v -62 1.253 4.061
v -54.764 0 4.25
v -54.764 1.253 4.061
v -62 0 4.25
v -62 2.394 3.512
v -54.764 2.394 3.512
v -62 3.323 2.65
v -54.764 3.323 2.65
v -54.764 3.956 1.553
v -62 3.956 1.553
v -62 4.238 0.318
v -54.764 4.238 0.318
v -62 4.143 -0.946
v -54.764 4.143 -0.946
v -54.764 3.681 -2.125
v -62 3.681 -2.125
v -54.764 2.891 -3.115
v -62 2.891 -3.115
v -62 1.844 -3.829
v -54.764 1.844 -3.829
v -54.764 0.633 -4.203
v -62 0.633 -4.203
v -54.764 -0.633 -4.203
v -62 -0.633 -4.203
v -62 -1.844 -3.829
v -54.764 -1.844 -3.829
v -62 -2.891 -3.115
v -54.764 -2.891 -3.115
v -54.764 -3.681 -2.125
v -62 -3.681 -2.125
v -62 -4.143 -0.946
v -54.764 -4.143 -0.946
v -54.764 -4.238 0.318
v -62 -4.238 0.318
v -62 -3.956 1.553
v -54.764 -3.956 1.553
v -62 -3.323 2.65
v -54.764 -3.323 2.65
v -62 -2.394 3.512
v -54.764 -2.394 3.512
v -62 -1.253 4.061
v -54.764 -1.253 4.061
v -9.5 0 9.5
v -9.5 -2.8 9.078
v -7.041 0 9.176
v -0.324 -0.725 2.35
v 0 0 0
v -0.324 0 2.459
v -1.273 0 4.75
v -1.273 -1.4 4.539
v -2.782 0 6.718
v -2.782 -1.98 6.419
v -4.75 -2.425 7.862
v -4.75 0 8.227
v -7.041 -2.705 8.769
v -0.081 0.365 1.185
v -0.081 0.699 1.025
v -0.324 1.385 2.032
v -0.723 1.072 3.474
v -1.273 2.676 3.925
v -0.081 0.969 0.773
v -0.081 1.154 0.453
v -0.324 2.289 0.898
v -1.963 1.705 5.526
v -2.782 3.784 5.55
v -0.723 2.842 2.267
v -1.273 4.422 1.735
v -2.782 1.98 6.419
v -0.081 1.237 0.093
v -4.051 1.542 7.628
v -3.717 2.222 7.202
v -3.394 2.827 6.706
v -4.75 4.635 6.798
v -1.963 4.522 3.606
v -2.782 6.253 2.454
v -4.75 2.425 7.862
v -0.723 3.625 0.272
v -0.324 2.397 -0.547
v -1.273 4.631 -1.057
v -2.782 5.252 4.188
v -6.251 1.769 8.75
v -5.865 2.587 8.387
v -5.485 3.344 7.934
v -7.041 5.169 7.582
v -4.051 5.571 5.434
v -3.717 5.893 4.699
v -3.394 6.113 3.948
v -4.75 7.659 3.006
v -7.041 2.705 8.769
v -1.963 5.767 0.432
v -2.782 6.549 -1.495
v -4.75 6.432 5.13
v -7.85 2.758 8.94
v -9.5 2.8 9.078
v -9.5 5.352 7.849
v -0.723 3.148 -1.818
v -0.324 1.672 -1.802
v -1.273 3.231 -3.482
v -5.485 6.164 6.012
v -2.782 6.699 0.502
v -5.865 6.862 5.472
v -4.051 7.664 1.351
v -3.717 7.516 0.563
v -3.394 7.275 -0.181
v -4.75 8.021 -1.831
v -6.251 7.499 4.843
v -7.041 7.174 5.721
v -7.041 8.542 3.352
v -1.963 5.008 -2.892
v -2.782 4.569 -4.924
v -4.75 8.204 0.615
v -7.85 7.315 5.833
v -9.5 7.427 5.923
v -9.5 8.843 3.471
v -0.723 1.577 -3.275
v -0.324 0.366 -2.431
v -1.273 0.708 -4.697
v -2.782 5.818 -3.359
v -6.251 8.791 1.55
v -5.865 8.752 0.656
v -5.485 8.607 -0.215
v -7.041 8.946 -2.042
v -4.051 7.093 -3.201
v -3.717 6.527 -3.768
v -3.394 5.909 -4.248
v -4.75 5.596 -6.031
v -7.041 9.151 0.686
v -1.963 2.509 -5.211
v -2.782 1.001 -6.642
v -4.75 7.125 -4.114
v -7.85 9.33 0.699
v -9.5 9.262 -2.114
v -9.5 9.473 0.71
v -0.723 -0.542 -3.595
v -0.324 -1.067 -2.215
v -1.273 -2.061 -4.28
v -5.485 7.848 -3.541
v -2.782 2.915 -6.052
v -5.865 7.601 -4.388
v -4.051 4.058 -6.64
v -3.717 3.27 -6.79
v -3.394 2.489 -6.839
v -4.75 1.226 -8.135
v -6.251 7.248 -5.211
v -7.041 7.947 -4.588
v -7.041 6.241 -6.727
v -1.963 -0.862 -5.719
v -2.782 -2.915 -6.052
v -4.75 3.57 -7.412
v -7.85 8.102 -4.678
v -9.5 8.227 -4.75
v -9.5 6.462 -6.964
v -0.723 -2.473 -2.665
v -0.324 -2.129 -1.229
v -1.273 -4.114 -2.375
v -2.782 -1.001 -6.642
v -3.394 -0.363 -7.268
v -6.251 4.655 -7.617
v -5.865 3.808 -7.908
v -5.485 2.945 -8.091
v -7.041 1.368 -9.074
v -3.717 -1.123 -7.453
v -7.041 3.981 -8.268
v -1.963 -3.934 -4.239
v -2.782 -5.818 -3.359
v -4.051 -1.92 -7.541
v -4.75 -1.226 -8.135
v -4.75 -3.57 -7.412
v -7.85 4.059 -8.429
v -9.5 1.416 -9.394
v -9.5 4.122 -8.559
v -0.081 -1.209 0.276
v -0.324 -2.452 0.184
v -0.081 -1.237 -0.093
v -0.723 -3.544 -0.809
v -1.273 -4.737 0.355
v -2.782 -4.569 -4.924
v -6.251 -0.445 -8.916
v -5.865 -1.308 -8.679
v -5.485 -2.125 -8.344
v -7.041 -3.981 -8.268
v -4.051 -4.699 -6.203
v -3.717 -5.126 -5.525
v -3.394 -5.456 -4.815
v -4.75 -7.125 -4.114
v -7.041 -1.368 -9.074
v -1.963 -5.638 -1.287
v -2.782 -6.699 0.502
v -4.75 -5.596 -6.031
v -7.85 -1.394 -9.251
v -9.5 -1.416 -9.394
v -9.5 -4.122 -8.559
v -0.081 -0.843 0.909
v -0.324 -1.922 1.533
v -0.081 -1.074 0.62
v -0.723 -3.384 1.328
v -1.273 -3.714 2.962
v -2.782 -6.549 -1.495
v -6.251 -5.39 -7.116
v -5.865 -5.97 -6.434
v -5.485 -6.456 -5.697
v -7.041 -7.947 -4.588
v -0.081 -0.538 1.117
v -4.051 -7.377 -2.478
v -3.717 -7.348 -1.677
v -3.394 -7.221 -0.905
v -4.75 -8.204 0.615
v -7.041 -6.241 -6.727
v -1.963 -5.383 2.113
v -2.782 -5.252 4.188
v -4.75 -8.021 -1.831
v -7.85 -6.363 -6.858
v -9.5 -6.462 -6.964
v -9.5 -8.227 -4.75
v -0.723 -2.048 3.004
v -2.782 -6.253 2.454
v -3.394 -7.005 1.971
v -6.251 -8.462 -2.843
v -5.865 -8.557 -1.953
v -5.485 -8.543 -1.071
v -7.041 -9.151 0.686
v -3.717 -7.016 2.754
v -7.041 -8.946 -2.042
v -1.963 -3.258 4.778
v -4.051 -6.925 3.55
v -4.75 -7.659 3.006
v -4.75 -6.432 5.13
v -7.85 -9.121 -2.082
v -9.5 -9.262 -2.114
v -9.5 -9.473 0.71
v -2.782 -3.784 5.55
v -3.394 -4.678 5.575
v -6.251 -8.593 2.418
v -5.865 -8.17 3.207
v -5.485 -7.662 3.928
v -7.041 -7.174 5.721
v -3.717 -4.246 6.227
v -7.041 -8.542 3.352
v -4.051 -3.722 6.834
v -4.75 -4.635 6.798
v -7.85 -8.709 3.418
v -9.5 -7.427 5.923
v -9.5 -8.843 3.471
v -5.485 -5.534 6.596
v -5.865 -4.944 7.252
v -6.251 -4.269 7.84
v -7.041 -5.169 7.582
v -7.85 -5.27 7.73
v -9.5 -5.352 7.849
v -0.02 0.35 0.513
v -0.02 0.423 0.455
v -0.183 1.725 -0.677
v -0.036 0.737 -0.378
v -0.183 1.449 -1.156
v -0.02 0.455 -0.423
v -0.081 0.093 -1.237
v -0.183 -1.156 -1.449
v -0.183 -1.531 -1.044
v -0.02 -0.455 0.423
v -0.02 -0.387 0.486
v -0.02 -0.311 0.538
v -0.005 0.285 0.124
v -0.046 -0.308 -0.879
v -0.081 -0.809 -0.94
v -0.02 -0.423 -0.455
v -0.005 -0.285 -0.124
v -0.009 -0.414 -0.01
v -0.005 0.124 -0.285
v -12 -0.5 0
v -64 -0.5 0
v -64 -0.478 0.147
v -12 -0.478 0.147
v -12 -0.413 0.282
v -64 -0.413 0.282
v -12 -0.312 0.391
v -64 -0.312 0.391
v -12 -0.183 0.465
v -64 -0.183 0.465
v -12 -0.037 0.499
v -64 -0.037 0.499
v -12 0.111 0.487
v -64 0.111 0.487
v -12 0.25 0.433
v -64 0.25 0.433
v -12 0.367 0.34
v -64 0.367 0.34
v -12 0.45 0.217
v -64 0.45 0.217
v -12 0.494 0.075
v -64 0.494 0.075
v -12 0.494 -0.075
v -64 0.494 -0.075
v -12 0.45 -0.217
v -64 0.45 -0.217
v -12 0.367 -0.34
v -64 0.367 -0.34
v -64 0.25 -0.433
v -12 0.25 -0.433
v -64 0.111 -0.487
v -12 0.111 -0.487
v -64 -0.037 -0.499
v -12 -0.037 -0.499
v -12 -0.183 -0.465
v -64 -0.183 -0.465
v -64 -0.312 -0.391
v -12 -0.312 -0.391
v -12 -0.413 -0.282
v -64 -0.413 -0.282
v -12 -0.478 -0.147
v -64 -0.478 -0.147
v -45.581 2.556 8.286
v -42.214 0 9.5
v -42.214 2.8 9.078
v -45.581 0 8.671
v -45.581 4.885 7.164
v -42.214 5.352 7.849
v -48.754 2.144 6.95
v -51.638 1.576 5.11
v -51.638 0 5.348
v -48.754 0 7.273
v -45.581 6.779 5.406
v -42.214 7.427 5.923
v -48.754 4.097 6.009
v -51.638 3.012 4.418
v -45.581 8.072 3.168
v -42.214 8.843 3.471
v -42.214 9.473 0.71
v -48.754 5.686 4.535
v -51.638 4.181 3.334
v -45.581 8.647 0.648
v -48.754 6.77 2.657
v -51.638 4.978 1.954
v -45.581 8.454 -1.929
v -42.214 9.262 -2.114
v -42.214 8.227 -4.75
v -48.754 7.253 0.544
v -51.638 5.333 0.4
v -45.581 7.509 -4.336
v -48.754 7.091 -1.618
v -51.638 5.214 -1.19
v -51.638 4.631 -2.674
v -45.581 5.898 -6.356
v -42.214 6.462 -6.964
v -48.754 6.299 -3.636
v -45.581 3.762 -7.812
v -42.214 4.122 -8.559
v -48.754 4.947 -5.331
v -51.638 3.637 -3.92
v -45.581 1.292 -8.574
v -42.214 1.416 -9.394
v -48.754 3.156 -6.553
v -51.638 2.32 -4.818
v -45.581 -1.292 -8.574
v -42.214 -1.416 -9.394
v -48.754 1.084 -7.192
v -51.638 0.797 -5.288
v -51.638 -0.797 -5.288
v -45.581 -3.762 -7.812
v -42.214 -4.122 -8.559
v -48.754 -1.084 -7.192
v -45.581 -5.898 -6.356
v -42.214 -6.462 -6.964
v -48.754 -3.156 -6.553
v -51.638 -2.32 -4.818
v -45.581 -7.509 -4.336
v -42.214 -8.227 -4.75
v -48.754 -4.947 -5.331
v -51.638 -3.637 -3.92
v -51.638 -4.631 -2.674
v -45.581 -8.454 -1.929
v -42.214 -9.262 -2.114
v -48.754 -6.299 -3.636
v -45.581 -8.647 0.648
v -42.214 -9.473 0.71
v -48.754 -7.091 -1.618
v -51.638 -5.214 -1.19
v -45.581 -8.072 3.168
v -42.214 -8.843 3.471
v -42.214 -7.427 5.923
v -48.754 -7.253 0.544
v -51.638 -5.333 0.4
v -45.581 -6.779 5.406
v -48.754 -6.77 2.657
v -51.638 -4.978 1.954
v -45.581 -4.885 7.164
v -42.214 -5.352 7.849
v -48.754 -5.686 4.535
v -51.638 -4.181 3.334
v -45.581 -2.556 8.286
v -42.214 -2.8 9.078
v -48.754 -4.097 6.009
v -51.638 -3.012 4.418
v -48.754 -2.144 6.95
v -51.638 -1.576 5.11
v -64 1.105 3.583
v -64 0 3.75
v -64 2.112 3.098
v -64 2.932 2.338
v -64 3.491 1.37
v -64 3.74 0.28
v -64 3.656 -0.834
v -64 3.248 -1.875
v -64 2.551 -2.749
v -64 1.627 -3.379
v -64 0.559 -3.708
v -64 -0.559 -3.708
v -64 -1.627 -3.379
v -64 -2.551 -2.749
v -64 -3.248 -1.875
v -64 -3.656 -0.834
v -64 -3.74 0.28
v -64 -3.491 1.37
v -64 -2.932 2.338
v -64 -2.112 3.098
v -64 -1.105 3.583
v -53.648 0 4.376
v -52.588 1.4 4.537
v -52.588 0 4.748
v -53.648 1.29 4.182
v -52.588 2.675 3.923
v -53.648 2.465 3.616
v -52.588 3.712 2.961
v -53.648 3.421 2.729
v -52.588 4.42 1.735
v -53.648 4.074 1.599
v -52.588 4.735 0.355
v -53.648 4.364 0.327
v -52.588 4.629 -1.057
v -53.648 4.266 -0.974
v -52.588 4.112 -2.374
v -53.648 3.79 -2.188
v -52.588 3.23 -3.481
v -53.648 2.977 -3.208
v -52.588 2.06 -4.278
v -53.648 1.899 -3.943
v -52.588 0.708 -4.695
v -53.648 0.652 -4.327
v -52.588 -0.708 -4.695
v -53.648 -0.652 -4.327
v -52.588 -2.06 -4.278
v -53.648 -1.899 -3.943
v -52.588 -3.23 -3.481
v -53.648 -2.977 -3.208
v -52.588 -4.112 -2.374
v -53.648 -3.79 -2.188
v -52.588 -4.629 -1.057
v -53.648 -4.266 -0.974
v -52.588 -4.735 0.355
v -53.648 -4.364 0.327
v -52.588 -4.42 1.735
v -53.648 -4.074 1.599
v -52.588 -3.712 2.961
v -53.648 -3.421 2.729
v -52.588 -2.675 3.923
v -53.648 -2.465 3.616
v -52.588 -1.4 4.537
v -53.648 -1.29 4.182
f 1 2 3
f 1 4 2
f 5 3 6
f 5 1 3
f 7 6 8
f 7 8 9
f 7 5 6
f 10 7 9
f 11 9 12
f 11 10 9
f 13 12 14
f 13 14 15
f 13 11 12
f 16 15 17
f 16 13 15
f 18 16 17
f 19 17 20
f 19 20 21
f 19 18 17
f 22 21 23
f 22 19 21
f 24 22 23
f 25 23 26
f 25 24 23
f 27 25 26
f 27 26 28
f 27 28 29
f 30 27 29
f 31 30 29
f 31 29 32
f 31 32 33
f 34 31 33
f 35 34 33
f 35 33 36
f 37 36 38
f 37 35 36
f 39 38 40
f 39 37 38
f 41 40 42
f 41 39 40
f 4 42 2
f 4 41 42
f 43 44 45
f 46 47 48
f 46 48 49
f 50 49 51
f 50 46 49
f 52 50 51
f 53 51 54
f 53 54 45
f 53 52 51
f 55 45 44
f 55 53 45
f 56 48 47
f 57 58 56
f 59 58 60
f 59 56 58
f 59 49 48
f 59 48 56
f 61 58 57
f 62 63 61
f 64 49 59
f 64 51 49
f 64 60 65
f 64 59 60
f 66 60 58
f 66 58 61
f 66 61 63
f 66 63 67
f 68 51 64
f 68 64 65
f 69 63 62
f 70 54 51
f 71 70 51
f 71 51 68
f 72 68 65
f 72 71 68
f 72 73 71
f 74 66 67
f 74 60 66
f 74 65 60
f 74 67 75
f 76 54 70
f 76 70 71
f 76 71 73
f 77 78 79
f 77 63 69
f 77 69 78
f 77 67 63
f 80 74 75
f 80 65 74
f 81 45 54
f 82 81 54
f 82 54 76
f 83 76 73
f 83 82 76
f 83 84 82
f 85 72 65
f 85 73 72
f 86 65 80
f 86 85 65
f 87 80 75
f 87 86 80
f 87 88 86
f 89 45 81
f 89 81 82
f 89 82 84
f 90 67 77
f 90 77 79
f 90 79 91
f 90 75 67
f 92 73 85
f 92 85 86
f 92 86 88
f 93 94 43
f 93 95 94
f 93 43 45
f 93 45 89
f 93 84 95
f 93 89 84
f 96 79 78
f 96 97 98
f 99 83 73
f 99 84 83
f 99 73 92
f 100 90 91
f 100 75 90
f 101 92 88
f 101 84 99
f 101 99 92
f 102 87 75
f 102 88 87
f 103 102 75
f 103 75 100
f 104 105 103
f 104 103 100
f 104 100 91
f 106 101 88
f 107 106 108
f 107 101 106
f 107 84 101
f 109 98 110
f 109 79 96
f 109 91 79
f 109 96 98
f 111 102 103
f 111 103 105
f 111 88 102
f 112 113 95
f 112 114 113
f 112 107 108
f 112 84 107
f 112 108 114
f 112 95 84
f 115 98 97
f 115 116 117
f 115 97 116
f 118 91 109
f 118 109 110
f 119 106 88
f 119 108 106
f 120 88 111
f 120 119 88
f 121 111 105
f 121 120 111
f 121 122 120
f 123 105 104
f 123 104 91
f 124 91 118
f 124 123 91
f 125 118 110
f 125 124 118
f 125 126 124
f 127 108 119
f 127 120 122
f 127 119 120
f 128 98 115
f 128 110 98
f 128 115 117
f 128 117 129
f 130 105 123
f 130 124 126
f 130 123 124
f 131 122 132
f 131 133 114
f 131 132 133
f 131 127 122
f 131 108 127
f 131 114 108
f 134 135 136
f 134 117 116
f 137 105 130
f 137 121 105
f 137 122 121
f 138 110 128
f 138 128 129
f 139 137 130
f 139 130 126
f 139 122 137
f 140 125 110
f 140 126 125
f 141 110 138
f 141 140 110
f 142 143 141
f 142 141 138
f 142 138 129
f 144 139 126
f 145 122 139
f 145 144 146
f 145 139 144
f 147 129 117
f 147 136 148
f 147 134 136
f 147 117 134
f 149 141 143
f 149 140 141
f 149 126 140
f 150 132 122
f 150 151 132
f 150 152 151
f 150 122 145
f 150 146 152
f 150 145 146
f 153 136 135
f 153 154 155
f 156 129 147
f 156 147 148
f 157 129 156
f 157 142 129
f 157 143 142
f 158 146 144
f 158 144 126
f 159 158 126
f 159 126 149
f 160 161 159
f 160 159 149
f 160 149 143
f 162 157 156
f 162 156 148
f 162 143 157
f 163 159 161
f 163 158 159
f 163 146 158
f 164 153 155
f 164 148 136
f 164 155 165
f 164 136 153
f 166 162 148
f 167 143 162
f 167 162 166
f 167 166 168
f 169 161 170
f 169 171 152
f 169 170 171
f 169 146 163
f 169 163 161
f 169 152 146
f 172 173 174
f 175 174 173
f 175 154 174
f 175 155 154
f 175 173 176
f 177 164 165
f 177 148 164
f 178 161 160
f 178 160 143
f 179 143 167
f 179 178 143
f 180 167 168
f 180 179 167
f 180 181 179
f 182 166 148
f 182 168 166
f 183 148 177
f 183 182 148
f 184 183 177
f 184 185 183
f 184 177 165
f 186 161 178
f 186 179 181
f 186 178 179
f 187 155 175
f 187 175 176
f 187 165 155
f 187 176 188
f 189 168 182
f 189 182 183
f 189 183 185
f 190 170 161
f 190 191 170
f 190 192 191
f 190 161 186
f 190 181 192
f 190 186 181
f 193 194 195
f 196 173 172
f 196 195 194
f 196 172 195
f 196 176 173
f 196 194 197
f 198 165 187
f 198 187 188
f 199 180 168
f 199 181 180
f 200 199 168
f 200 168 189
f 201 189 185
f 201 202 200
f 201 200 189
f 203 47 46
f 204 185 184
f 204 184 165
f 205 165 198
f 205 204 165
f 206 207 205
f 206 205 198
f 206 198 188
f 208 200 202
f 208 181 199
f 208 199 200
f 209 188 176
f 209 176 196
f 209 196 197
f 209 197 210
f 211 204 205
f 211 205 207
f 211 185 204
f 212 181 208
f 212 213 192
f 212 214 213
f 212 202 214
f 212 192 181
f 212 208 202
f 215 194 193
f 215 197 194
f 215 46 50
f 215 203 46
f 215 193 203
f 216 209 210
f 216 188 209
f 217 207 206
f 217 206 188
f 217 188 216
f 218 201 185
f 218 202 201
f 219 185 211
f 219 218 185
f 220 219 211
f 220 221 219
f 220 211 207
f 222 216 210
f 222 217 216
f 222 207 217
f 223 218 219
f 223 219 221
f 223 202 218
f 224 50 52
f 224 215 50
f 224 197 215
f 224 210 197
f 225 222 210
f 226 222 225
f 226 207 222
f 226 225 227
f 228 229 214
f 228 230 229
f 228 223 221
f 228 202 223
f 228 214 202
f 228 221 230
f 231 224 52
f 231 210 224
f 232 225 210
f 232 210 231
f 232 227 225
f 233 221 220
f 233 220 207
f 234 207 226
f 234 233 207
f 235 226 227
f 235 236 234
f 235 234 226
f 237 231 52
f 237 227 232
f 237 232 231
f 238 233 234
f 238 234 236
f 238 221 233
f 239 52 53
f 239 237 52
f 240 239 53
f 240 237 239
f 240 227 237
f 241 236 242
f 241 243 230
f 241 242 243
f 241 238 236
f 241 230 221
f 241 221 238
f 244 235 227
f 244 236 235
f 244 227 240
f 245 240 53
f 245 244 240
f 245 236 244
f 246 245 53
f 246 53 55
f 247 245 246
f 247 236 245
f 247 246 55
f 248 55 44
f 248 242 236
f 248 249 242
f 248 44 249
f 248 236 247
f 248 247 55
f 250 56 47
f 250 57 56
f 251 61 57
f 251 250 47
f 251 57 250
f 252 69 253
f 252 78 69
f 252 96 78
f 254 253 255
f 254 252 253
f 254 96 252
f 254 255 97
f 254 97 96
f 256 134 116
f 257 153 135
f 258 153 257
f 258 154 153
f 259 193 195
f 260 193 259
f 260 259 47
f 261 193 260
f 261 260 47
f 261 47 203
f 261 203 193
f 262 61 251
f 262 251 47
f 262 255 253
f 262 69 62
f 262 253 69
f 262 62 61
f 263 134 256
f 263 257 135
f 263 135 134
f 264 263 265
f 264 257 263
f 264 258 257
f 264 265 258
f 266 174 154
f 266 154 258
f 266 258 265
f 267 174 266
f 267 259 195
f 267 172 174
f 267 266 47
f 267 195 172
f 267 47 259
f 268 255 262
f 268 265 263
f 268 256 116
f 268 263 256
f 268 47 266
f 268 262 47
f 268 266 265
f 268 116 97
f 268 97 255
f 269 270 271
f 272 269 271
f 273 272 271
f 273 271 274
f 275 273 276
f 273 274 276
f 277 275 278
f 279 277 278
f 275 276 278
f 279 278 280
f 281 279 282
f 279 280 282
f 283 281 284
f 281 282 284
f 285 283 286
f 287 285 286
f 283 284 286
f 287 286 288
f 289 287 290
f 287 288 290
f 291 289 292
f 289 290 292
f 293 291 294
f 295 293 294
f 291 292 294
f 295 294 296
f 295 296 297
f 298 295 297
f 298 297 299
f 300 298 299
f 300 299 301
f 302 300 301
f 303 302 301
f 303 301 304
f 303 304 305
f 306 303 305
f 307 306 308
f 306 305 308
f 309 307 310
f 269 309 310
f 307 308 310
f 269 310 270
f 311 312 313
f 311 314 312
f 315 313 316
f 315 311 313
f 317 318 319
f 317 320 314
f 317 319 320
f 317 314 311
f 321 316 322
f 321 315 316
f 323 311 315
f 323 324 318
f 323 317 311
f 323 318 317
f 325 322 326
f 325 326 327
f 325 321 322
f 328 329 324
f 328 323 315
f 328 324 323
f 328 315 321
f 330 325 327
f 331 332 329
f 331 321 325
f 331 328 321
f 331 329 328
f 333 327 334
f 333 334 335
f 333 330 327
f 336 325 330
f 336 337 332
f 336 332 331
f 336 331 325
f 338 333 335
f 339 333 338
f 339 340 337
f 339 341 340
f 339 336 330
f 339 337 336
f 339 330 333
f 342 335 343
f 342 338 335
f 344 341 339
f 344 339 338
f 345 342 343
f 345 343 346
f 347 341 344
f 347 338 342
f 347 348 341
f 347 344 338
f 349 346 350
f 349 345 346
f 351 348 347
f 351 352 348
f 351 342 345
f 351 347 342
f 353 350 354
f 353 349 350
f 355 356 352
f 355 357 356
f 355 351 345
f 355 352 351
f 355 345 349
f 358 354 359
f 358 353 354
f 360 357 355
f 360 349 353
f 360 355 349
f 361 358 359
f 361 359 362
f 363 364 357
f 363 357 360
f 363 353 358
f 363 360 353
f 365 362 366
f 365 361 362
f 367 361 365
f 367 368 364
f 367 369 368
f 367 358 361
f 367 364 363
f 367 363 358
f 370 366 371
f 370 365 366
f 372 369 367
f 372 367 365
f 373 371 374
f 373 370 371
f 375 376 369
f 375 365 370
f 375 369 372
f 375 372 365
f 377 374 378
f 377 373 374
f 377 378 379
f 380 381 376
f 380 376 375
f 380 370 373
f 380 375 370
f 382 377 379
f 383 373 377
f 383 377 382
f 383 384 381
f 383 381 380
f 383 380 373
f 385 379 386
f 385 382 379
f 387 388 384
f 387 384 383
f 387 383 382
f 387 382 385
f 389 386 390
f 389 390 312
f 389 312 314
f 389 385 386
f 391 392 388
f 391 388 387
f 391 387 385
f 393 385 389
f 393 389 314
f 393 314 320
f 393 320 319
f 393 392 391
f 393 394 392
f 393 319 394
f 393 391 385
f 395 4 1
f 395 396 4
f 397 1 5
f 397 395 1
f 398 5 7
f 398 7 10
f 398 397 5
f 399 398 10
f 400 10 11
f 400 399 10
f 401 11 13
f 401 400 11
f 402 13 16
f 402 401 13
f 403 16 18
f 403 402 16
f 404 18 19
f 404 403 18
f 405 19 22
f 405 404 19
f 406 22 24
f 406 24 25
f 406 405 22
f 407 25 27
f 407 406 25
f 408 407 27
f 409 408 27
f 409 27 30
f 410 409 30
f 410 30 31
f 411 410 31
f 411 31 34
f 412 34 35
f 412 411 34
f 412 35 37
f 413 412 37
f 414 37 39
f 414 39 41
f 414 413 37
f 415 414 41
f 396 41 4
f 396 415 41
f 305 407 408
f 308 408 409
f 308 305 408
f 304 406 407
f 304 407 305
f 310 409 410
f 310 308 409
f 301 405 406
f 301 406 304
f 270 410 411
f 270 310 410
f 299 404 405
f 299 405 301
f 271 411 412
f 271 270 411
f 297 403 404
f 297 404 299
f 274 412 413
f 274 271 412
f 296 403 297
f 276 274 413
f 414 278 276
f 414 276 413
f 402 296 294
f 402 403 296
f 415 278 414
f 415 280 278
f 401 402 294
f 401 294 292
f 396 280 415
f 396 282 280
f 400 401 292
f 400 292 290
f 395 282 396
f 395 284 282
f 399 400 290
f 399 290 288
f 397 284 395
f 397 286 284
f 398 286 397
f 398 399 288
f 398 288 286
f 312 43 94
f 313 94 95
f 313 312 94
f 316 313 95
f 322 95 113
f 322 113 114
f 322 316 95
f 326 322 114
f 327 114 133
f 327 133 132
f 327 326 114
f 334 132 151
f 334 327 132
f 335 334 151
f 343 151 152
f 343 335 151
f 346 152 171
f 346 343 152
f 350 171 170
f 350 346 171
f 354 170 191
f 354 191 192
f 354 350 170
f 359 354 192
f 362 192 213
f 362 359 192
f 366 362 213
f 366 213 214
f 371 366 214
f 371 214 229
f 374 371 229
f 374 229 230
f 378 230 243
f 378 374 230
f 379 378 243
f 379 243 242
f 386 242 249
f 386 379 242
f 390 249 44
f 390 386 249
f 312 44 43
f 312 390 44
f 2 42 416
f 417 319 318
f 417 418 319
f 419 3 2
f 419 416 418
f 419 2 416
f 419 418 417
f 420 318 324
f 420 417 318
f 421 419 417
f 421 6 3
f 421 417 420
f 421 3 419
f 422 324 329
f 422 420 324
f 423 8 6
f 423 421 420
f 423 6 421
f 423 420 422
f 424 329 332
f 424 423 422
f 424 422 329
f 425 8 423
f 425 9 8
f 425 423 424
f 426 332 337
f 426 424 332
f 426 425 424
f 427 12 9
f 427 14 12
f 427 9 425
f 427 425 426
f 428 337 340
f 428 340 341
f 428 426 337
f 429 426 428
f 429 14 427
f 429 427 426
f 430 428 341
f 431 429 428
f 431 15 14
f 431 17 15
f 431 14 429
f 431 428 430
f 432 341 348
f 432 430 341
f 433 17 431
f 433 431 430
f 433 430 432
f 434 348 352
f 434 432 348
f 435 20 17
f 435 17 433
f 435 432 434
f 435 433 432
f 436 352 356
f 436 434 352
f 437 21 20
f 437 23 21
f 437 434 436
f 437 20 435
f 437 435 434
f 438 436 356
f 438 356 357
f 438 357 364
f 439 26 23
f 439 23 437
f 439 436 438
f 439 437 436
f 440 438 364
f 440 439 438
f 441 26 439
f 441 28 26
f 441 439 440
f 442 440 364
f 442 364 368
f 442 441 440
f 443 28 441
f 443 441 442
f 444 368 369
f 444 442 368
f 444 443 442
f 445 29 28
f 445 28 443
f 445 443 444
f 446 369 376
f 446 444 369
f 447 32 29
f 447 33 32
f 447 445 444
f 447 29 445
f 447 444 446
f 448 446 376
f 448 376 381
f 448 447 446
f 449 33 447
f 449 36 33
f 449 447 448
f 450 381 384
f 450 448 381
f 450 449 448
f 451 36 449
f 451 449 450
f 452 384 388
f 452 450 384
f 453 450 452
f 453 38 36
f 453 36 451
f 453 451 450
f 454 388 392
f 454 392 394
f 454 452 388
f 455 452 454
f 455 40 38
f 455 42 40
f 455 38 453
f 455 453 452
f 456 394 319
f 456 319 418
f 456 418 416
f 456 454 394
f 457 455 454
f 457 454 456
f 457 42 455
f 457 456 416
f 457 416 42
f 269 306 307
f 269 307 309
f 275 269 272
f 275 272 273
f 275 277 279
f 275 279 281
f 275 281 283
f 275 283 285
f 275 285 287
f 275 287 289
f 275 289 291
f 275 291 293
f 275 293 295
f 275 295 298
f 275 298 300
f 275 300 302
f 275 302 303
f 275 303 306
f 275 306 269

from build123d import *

# Parameters (mm, degrees)
F2_R     = 0.5
F3_DEPTH = 52


with BuildPart() as f1:
    # F0 (on Front) → F1 (revolve)
    with BuildSketch(Plane.XZ):
        with BuildLine():
            Line((-9.5, 0), (0, 0))
            ThreePointArc((0, 0), (-2.782486, 6.717514), (-9.5, 9.5))
            Line((-9.5, 9.5), (-42.213703, 9.5))
            ThreePointArc((-42.213703, 9.5), (-47.19787, 8.040891), (-51.638326, 5.347701))
            ThreePointArc((-51.638326, 5.347701), (-53.107777, 4.5324), (-54.764356, 4.25))
            Line((-54.764356, 4.25), (-62, 4.25))
            Line((-62, 4.25), (-64, 3.75))
            Line((-64, 3.75), (-64, 0))
            Line((-64, 0), (-56, 0))
            Line((-56, 0), (-9.5, 0))
        make_face()
    revolve(axis=Axis((-32, 0, 0), (-1, 0, 0)))

    # F2 (on face) → F3 (cut)
    with BuildSketch(Plane(origin=(-64, 0, 0), x_dir=(0, -1, 0), z_dir=(-1, 0, 0))):
        Circle(F2_R)
    extrude(amount=-F3_DEPTH, mode=Mode.SUBTRACT)


solid = f1.part
